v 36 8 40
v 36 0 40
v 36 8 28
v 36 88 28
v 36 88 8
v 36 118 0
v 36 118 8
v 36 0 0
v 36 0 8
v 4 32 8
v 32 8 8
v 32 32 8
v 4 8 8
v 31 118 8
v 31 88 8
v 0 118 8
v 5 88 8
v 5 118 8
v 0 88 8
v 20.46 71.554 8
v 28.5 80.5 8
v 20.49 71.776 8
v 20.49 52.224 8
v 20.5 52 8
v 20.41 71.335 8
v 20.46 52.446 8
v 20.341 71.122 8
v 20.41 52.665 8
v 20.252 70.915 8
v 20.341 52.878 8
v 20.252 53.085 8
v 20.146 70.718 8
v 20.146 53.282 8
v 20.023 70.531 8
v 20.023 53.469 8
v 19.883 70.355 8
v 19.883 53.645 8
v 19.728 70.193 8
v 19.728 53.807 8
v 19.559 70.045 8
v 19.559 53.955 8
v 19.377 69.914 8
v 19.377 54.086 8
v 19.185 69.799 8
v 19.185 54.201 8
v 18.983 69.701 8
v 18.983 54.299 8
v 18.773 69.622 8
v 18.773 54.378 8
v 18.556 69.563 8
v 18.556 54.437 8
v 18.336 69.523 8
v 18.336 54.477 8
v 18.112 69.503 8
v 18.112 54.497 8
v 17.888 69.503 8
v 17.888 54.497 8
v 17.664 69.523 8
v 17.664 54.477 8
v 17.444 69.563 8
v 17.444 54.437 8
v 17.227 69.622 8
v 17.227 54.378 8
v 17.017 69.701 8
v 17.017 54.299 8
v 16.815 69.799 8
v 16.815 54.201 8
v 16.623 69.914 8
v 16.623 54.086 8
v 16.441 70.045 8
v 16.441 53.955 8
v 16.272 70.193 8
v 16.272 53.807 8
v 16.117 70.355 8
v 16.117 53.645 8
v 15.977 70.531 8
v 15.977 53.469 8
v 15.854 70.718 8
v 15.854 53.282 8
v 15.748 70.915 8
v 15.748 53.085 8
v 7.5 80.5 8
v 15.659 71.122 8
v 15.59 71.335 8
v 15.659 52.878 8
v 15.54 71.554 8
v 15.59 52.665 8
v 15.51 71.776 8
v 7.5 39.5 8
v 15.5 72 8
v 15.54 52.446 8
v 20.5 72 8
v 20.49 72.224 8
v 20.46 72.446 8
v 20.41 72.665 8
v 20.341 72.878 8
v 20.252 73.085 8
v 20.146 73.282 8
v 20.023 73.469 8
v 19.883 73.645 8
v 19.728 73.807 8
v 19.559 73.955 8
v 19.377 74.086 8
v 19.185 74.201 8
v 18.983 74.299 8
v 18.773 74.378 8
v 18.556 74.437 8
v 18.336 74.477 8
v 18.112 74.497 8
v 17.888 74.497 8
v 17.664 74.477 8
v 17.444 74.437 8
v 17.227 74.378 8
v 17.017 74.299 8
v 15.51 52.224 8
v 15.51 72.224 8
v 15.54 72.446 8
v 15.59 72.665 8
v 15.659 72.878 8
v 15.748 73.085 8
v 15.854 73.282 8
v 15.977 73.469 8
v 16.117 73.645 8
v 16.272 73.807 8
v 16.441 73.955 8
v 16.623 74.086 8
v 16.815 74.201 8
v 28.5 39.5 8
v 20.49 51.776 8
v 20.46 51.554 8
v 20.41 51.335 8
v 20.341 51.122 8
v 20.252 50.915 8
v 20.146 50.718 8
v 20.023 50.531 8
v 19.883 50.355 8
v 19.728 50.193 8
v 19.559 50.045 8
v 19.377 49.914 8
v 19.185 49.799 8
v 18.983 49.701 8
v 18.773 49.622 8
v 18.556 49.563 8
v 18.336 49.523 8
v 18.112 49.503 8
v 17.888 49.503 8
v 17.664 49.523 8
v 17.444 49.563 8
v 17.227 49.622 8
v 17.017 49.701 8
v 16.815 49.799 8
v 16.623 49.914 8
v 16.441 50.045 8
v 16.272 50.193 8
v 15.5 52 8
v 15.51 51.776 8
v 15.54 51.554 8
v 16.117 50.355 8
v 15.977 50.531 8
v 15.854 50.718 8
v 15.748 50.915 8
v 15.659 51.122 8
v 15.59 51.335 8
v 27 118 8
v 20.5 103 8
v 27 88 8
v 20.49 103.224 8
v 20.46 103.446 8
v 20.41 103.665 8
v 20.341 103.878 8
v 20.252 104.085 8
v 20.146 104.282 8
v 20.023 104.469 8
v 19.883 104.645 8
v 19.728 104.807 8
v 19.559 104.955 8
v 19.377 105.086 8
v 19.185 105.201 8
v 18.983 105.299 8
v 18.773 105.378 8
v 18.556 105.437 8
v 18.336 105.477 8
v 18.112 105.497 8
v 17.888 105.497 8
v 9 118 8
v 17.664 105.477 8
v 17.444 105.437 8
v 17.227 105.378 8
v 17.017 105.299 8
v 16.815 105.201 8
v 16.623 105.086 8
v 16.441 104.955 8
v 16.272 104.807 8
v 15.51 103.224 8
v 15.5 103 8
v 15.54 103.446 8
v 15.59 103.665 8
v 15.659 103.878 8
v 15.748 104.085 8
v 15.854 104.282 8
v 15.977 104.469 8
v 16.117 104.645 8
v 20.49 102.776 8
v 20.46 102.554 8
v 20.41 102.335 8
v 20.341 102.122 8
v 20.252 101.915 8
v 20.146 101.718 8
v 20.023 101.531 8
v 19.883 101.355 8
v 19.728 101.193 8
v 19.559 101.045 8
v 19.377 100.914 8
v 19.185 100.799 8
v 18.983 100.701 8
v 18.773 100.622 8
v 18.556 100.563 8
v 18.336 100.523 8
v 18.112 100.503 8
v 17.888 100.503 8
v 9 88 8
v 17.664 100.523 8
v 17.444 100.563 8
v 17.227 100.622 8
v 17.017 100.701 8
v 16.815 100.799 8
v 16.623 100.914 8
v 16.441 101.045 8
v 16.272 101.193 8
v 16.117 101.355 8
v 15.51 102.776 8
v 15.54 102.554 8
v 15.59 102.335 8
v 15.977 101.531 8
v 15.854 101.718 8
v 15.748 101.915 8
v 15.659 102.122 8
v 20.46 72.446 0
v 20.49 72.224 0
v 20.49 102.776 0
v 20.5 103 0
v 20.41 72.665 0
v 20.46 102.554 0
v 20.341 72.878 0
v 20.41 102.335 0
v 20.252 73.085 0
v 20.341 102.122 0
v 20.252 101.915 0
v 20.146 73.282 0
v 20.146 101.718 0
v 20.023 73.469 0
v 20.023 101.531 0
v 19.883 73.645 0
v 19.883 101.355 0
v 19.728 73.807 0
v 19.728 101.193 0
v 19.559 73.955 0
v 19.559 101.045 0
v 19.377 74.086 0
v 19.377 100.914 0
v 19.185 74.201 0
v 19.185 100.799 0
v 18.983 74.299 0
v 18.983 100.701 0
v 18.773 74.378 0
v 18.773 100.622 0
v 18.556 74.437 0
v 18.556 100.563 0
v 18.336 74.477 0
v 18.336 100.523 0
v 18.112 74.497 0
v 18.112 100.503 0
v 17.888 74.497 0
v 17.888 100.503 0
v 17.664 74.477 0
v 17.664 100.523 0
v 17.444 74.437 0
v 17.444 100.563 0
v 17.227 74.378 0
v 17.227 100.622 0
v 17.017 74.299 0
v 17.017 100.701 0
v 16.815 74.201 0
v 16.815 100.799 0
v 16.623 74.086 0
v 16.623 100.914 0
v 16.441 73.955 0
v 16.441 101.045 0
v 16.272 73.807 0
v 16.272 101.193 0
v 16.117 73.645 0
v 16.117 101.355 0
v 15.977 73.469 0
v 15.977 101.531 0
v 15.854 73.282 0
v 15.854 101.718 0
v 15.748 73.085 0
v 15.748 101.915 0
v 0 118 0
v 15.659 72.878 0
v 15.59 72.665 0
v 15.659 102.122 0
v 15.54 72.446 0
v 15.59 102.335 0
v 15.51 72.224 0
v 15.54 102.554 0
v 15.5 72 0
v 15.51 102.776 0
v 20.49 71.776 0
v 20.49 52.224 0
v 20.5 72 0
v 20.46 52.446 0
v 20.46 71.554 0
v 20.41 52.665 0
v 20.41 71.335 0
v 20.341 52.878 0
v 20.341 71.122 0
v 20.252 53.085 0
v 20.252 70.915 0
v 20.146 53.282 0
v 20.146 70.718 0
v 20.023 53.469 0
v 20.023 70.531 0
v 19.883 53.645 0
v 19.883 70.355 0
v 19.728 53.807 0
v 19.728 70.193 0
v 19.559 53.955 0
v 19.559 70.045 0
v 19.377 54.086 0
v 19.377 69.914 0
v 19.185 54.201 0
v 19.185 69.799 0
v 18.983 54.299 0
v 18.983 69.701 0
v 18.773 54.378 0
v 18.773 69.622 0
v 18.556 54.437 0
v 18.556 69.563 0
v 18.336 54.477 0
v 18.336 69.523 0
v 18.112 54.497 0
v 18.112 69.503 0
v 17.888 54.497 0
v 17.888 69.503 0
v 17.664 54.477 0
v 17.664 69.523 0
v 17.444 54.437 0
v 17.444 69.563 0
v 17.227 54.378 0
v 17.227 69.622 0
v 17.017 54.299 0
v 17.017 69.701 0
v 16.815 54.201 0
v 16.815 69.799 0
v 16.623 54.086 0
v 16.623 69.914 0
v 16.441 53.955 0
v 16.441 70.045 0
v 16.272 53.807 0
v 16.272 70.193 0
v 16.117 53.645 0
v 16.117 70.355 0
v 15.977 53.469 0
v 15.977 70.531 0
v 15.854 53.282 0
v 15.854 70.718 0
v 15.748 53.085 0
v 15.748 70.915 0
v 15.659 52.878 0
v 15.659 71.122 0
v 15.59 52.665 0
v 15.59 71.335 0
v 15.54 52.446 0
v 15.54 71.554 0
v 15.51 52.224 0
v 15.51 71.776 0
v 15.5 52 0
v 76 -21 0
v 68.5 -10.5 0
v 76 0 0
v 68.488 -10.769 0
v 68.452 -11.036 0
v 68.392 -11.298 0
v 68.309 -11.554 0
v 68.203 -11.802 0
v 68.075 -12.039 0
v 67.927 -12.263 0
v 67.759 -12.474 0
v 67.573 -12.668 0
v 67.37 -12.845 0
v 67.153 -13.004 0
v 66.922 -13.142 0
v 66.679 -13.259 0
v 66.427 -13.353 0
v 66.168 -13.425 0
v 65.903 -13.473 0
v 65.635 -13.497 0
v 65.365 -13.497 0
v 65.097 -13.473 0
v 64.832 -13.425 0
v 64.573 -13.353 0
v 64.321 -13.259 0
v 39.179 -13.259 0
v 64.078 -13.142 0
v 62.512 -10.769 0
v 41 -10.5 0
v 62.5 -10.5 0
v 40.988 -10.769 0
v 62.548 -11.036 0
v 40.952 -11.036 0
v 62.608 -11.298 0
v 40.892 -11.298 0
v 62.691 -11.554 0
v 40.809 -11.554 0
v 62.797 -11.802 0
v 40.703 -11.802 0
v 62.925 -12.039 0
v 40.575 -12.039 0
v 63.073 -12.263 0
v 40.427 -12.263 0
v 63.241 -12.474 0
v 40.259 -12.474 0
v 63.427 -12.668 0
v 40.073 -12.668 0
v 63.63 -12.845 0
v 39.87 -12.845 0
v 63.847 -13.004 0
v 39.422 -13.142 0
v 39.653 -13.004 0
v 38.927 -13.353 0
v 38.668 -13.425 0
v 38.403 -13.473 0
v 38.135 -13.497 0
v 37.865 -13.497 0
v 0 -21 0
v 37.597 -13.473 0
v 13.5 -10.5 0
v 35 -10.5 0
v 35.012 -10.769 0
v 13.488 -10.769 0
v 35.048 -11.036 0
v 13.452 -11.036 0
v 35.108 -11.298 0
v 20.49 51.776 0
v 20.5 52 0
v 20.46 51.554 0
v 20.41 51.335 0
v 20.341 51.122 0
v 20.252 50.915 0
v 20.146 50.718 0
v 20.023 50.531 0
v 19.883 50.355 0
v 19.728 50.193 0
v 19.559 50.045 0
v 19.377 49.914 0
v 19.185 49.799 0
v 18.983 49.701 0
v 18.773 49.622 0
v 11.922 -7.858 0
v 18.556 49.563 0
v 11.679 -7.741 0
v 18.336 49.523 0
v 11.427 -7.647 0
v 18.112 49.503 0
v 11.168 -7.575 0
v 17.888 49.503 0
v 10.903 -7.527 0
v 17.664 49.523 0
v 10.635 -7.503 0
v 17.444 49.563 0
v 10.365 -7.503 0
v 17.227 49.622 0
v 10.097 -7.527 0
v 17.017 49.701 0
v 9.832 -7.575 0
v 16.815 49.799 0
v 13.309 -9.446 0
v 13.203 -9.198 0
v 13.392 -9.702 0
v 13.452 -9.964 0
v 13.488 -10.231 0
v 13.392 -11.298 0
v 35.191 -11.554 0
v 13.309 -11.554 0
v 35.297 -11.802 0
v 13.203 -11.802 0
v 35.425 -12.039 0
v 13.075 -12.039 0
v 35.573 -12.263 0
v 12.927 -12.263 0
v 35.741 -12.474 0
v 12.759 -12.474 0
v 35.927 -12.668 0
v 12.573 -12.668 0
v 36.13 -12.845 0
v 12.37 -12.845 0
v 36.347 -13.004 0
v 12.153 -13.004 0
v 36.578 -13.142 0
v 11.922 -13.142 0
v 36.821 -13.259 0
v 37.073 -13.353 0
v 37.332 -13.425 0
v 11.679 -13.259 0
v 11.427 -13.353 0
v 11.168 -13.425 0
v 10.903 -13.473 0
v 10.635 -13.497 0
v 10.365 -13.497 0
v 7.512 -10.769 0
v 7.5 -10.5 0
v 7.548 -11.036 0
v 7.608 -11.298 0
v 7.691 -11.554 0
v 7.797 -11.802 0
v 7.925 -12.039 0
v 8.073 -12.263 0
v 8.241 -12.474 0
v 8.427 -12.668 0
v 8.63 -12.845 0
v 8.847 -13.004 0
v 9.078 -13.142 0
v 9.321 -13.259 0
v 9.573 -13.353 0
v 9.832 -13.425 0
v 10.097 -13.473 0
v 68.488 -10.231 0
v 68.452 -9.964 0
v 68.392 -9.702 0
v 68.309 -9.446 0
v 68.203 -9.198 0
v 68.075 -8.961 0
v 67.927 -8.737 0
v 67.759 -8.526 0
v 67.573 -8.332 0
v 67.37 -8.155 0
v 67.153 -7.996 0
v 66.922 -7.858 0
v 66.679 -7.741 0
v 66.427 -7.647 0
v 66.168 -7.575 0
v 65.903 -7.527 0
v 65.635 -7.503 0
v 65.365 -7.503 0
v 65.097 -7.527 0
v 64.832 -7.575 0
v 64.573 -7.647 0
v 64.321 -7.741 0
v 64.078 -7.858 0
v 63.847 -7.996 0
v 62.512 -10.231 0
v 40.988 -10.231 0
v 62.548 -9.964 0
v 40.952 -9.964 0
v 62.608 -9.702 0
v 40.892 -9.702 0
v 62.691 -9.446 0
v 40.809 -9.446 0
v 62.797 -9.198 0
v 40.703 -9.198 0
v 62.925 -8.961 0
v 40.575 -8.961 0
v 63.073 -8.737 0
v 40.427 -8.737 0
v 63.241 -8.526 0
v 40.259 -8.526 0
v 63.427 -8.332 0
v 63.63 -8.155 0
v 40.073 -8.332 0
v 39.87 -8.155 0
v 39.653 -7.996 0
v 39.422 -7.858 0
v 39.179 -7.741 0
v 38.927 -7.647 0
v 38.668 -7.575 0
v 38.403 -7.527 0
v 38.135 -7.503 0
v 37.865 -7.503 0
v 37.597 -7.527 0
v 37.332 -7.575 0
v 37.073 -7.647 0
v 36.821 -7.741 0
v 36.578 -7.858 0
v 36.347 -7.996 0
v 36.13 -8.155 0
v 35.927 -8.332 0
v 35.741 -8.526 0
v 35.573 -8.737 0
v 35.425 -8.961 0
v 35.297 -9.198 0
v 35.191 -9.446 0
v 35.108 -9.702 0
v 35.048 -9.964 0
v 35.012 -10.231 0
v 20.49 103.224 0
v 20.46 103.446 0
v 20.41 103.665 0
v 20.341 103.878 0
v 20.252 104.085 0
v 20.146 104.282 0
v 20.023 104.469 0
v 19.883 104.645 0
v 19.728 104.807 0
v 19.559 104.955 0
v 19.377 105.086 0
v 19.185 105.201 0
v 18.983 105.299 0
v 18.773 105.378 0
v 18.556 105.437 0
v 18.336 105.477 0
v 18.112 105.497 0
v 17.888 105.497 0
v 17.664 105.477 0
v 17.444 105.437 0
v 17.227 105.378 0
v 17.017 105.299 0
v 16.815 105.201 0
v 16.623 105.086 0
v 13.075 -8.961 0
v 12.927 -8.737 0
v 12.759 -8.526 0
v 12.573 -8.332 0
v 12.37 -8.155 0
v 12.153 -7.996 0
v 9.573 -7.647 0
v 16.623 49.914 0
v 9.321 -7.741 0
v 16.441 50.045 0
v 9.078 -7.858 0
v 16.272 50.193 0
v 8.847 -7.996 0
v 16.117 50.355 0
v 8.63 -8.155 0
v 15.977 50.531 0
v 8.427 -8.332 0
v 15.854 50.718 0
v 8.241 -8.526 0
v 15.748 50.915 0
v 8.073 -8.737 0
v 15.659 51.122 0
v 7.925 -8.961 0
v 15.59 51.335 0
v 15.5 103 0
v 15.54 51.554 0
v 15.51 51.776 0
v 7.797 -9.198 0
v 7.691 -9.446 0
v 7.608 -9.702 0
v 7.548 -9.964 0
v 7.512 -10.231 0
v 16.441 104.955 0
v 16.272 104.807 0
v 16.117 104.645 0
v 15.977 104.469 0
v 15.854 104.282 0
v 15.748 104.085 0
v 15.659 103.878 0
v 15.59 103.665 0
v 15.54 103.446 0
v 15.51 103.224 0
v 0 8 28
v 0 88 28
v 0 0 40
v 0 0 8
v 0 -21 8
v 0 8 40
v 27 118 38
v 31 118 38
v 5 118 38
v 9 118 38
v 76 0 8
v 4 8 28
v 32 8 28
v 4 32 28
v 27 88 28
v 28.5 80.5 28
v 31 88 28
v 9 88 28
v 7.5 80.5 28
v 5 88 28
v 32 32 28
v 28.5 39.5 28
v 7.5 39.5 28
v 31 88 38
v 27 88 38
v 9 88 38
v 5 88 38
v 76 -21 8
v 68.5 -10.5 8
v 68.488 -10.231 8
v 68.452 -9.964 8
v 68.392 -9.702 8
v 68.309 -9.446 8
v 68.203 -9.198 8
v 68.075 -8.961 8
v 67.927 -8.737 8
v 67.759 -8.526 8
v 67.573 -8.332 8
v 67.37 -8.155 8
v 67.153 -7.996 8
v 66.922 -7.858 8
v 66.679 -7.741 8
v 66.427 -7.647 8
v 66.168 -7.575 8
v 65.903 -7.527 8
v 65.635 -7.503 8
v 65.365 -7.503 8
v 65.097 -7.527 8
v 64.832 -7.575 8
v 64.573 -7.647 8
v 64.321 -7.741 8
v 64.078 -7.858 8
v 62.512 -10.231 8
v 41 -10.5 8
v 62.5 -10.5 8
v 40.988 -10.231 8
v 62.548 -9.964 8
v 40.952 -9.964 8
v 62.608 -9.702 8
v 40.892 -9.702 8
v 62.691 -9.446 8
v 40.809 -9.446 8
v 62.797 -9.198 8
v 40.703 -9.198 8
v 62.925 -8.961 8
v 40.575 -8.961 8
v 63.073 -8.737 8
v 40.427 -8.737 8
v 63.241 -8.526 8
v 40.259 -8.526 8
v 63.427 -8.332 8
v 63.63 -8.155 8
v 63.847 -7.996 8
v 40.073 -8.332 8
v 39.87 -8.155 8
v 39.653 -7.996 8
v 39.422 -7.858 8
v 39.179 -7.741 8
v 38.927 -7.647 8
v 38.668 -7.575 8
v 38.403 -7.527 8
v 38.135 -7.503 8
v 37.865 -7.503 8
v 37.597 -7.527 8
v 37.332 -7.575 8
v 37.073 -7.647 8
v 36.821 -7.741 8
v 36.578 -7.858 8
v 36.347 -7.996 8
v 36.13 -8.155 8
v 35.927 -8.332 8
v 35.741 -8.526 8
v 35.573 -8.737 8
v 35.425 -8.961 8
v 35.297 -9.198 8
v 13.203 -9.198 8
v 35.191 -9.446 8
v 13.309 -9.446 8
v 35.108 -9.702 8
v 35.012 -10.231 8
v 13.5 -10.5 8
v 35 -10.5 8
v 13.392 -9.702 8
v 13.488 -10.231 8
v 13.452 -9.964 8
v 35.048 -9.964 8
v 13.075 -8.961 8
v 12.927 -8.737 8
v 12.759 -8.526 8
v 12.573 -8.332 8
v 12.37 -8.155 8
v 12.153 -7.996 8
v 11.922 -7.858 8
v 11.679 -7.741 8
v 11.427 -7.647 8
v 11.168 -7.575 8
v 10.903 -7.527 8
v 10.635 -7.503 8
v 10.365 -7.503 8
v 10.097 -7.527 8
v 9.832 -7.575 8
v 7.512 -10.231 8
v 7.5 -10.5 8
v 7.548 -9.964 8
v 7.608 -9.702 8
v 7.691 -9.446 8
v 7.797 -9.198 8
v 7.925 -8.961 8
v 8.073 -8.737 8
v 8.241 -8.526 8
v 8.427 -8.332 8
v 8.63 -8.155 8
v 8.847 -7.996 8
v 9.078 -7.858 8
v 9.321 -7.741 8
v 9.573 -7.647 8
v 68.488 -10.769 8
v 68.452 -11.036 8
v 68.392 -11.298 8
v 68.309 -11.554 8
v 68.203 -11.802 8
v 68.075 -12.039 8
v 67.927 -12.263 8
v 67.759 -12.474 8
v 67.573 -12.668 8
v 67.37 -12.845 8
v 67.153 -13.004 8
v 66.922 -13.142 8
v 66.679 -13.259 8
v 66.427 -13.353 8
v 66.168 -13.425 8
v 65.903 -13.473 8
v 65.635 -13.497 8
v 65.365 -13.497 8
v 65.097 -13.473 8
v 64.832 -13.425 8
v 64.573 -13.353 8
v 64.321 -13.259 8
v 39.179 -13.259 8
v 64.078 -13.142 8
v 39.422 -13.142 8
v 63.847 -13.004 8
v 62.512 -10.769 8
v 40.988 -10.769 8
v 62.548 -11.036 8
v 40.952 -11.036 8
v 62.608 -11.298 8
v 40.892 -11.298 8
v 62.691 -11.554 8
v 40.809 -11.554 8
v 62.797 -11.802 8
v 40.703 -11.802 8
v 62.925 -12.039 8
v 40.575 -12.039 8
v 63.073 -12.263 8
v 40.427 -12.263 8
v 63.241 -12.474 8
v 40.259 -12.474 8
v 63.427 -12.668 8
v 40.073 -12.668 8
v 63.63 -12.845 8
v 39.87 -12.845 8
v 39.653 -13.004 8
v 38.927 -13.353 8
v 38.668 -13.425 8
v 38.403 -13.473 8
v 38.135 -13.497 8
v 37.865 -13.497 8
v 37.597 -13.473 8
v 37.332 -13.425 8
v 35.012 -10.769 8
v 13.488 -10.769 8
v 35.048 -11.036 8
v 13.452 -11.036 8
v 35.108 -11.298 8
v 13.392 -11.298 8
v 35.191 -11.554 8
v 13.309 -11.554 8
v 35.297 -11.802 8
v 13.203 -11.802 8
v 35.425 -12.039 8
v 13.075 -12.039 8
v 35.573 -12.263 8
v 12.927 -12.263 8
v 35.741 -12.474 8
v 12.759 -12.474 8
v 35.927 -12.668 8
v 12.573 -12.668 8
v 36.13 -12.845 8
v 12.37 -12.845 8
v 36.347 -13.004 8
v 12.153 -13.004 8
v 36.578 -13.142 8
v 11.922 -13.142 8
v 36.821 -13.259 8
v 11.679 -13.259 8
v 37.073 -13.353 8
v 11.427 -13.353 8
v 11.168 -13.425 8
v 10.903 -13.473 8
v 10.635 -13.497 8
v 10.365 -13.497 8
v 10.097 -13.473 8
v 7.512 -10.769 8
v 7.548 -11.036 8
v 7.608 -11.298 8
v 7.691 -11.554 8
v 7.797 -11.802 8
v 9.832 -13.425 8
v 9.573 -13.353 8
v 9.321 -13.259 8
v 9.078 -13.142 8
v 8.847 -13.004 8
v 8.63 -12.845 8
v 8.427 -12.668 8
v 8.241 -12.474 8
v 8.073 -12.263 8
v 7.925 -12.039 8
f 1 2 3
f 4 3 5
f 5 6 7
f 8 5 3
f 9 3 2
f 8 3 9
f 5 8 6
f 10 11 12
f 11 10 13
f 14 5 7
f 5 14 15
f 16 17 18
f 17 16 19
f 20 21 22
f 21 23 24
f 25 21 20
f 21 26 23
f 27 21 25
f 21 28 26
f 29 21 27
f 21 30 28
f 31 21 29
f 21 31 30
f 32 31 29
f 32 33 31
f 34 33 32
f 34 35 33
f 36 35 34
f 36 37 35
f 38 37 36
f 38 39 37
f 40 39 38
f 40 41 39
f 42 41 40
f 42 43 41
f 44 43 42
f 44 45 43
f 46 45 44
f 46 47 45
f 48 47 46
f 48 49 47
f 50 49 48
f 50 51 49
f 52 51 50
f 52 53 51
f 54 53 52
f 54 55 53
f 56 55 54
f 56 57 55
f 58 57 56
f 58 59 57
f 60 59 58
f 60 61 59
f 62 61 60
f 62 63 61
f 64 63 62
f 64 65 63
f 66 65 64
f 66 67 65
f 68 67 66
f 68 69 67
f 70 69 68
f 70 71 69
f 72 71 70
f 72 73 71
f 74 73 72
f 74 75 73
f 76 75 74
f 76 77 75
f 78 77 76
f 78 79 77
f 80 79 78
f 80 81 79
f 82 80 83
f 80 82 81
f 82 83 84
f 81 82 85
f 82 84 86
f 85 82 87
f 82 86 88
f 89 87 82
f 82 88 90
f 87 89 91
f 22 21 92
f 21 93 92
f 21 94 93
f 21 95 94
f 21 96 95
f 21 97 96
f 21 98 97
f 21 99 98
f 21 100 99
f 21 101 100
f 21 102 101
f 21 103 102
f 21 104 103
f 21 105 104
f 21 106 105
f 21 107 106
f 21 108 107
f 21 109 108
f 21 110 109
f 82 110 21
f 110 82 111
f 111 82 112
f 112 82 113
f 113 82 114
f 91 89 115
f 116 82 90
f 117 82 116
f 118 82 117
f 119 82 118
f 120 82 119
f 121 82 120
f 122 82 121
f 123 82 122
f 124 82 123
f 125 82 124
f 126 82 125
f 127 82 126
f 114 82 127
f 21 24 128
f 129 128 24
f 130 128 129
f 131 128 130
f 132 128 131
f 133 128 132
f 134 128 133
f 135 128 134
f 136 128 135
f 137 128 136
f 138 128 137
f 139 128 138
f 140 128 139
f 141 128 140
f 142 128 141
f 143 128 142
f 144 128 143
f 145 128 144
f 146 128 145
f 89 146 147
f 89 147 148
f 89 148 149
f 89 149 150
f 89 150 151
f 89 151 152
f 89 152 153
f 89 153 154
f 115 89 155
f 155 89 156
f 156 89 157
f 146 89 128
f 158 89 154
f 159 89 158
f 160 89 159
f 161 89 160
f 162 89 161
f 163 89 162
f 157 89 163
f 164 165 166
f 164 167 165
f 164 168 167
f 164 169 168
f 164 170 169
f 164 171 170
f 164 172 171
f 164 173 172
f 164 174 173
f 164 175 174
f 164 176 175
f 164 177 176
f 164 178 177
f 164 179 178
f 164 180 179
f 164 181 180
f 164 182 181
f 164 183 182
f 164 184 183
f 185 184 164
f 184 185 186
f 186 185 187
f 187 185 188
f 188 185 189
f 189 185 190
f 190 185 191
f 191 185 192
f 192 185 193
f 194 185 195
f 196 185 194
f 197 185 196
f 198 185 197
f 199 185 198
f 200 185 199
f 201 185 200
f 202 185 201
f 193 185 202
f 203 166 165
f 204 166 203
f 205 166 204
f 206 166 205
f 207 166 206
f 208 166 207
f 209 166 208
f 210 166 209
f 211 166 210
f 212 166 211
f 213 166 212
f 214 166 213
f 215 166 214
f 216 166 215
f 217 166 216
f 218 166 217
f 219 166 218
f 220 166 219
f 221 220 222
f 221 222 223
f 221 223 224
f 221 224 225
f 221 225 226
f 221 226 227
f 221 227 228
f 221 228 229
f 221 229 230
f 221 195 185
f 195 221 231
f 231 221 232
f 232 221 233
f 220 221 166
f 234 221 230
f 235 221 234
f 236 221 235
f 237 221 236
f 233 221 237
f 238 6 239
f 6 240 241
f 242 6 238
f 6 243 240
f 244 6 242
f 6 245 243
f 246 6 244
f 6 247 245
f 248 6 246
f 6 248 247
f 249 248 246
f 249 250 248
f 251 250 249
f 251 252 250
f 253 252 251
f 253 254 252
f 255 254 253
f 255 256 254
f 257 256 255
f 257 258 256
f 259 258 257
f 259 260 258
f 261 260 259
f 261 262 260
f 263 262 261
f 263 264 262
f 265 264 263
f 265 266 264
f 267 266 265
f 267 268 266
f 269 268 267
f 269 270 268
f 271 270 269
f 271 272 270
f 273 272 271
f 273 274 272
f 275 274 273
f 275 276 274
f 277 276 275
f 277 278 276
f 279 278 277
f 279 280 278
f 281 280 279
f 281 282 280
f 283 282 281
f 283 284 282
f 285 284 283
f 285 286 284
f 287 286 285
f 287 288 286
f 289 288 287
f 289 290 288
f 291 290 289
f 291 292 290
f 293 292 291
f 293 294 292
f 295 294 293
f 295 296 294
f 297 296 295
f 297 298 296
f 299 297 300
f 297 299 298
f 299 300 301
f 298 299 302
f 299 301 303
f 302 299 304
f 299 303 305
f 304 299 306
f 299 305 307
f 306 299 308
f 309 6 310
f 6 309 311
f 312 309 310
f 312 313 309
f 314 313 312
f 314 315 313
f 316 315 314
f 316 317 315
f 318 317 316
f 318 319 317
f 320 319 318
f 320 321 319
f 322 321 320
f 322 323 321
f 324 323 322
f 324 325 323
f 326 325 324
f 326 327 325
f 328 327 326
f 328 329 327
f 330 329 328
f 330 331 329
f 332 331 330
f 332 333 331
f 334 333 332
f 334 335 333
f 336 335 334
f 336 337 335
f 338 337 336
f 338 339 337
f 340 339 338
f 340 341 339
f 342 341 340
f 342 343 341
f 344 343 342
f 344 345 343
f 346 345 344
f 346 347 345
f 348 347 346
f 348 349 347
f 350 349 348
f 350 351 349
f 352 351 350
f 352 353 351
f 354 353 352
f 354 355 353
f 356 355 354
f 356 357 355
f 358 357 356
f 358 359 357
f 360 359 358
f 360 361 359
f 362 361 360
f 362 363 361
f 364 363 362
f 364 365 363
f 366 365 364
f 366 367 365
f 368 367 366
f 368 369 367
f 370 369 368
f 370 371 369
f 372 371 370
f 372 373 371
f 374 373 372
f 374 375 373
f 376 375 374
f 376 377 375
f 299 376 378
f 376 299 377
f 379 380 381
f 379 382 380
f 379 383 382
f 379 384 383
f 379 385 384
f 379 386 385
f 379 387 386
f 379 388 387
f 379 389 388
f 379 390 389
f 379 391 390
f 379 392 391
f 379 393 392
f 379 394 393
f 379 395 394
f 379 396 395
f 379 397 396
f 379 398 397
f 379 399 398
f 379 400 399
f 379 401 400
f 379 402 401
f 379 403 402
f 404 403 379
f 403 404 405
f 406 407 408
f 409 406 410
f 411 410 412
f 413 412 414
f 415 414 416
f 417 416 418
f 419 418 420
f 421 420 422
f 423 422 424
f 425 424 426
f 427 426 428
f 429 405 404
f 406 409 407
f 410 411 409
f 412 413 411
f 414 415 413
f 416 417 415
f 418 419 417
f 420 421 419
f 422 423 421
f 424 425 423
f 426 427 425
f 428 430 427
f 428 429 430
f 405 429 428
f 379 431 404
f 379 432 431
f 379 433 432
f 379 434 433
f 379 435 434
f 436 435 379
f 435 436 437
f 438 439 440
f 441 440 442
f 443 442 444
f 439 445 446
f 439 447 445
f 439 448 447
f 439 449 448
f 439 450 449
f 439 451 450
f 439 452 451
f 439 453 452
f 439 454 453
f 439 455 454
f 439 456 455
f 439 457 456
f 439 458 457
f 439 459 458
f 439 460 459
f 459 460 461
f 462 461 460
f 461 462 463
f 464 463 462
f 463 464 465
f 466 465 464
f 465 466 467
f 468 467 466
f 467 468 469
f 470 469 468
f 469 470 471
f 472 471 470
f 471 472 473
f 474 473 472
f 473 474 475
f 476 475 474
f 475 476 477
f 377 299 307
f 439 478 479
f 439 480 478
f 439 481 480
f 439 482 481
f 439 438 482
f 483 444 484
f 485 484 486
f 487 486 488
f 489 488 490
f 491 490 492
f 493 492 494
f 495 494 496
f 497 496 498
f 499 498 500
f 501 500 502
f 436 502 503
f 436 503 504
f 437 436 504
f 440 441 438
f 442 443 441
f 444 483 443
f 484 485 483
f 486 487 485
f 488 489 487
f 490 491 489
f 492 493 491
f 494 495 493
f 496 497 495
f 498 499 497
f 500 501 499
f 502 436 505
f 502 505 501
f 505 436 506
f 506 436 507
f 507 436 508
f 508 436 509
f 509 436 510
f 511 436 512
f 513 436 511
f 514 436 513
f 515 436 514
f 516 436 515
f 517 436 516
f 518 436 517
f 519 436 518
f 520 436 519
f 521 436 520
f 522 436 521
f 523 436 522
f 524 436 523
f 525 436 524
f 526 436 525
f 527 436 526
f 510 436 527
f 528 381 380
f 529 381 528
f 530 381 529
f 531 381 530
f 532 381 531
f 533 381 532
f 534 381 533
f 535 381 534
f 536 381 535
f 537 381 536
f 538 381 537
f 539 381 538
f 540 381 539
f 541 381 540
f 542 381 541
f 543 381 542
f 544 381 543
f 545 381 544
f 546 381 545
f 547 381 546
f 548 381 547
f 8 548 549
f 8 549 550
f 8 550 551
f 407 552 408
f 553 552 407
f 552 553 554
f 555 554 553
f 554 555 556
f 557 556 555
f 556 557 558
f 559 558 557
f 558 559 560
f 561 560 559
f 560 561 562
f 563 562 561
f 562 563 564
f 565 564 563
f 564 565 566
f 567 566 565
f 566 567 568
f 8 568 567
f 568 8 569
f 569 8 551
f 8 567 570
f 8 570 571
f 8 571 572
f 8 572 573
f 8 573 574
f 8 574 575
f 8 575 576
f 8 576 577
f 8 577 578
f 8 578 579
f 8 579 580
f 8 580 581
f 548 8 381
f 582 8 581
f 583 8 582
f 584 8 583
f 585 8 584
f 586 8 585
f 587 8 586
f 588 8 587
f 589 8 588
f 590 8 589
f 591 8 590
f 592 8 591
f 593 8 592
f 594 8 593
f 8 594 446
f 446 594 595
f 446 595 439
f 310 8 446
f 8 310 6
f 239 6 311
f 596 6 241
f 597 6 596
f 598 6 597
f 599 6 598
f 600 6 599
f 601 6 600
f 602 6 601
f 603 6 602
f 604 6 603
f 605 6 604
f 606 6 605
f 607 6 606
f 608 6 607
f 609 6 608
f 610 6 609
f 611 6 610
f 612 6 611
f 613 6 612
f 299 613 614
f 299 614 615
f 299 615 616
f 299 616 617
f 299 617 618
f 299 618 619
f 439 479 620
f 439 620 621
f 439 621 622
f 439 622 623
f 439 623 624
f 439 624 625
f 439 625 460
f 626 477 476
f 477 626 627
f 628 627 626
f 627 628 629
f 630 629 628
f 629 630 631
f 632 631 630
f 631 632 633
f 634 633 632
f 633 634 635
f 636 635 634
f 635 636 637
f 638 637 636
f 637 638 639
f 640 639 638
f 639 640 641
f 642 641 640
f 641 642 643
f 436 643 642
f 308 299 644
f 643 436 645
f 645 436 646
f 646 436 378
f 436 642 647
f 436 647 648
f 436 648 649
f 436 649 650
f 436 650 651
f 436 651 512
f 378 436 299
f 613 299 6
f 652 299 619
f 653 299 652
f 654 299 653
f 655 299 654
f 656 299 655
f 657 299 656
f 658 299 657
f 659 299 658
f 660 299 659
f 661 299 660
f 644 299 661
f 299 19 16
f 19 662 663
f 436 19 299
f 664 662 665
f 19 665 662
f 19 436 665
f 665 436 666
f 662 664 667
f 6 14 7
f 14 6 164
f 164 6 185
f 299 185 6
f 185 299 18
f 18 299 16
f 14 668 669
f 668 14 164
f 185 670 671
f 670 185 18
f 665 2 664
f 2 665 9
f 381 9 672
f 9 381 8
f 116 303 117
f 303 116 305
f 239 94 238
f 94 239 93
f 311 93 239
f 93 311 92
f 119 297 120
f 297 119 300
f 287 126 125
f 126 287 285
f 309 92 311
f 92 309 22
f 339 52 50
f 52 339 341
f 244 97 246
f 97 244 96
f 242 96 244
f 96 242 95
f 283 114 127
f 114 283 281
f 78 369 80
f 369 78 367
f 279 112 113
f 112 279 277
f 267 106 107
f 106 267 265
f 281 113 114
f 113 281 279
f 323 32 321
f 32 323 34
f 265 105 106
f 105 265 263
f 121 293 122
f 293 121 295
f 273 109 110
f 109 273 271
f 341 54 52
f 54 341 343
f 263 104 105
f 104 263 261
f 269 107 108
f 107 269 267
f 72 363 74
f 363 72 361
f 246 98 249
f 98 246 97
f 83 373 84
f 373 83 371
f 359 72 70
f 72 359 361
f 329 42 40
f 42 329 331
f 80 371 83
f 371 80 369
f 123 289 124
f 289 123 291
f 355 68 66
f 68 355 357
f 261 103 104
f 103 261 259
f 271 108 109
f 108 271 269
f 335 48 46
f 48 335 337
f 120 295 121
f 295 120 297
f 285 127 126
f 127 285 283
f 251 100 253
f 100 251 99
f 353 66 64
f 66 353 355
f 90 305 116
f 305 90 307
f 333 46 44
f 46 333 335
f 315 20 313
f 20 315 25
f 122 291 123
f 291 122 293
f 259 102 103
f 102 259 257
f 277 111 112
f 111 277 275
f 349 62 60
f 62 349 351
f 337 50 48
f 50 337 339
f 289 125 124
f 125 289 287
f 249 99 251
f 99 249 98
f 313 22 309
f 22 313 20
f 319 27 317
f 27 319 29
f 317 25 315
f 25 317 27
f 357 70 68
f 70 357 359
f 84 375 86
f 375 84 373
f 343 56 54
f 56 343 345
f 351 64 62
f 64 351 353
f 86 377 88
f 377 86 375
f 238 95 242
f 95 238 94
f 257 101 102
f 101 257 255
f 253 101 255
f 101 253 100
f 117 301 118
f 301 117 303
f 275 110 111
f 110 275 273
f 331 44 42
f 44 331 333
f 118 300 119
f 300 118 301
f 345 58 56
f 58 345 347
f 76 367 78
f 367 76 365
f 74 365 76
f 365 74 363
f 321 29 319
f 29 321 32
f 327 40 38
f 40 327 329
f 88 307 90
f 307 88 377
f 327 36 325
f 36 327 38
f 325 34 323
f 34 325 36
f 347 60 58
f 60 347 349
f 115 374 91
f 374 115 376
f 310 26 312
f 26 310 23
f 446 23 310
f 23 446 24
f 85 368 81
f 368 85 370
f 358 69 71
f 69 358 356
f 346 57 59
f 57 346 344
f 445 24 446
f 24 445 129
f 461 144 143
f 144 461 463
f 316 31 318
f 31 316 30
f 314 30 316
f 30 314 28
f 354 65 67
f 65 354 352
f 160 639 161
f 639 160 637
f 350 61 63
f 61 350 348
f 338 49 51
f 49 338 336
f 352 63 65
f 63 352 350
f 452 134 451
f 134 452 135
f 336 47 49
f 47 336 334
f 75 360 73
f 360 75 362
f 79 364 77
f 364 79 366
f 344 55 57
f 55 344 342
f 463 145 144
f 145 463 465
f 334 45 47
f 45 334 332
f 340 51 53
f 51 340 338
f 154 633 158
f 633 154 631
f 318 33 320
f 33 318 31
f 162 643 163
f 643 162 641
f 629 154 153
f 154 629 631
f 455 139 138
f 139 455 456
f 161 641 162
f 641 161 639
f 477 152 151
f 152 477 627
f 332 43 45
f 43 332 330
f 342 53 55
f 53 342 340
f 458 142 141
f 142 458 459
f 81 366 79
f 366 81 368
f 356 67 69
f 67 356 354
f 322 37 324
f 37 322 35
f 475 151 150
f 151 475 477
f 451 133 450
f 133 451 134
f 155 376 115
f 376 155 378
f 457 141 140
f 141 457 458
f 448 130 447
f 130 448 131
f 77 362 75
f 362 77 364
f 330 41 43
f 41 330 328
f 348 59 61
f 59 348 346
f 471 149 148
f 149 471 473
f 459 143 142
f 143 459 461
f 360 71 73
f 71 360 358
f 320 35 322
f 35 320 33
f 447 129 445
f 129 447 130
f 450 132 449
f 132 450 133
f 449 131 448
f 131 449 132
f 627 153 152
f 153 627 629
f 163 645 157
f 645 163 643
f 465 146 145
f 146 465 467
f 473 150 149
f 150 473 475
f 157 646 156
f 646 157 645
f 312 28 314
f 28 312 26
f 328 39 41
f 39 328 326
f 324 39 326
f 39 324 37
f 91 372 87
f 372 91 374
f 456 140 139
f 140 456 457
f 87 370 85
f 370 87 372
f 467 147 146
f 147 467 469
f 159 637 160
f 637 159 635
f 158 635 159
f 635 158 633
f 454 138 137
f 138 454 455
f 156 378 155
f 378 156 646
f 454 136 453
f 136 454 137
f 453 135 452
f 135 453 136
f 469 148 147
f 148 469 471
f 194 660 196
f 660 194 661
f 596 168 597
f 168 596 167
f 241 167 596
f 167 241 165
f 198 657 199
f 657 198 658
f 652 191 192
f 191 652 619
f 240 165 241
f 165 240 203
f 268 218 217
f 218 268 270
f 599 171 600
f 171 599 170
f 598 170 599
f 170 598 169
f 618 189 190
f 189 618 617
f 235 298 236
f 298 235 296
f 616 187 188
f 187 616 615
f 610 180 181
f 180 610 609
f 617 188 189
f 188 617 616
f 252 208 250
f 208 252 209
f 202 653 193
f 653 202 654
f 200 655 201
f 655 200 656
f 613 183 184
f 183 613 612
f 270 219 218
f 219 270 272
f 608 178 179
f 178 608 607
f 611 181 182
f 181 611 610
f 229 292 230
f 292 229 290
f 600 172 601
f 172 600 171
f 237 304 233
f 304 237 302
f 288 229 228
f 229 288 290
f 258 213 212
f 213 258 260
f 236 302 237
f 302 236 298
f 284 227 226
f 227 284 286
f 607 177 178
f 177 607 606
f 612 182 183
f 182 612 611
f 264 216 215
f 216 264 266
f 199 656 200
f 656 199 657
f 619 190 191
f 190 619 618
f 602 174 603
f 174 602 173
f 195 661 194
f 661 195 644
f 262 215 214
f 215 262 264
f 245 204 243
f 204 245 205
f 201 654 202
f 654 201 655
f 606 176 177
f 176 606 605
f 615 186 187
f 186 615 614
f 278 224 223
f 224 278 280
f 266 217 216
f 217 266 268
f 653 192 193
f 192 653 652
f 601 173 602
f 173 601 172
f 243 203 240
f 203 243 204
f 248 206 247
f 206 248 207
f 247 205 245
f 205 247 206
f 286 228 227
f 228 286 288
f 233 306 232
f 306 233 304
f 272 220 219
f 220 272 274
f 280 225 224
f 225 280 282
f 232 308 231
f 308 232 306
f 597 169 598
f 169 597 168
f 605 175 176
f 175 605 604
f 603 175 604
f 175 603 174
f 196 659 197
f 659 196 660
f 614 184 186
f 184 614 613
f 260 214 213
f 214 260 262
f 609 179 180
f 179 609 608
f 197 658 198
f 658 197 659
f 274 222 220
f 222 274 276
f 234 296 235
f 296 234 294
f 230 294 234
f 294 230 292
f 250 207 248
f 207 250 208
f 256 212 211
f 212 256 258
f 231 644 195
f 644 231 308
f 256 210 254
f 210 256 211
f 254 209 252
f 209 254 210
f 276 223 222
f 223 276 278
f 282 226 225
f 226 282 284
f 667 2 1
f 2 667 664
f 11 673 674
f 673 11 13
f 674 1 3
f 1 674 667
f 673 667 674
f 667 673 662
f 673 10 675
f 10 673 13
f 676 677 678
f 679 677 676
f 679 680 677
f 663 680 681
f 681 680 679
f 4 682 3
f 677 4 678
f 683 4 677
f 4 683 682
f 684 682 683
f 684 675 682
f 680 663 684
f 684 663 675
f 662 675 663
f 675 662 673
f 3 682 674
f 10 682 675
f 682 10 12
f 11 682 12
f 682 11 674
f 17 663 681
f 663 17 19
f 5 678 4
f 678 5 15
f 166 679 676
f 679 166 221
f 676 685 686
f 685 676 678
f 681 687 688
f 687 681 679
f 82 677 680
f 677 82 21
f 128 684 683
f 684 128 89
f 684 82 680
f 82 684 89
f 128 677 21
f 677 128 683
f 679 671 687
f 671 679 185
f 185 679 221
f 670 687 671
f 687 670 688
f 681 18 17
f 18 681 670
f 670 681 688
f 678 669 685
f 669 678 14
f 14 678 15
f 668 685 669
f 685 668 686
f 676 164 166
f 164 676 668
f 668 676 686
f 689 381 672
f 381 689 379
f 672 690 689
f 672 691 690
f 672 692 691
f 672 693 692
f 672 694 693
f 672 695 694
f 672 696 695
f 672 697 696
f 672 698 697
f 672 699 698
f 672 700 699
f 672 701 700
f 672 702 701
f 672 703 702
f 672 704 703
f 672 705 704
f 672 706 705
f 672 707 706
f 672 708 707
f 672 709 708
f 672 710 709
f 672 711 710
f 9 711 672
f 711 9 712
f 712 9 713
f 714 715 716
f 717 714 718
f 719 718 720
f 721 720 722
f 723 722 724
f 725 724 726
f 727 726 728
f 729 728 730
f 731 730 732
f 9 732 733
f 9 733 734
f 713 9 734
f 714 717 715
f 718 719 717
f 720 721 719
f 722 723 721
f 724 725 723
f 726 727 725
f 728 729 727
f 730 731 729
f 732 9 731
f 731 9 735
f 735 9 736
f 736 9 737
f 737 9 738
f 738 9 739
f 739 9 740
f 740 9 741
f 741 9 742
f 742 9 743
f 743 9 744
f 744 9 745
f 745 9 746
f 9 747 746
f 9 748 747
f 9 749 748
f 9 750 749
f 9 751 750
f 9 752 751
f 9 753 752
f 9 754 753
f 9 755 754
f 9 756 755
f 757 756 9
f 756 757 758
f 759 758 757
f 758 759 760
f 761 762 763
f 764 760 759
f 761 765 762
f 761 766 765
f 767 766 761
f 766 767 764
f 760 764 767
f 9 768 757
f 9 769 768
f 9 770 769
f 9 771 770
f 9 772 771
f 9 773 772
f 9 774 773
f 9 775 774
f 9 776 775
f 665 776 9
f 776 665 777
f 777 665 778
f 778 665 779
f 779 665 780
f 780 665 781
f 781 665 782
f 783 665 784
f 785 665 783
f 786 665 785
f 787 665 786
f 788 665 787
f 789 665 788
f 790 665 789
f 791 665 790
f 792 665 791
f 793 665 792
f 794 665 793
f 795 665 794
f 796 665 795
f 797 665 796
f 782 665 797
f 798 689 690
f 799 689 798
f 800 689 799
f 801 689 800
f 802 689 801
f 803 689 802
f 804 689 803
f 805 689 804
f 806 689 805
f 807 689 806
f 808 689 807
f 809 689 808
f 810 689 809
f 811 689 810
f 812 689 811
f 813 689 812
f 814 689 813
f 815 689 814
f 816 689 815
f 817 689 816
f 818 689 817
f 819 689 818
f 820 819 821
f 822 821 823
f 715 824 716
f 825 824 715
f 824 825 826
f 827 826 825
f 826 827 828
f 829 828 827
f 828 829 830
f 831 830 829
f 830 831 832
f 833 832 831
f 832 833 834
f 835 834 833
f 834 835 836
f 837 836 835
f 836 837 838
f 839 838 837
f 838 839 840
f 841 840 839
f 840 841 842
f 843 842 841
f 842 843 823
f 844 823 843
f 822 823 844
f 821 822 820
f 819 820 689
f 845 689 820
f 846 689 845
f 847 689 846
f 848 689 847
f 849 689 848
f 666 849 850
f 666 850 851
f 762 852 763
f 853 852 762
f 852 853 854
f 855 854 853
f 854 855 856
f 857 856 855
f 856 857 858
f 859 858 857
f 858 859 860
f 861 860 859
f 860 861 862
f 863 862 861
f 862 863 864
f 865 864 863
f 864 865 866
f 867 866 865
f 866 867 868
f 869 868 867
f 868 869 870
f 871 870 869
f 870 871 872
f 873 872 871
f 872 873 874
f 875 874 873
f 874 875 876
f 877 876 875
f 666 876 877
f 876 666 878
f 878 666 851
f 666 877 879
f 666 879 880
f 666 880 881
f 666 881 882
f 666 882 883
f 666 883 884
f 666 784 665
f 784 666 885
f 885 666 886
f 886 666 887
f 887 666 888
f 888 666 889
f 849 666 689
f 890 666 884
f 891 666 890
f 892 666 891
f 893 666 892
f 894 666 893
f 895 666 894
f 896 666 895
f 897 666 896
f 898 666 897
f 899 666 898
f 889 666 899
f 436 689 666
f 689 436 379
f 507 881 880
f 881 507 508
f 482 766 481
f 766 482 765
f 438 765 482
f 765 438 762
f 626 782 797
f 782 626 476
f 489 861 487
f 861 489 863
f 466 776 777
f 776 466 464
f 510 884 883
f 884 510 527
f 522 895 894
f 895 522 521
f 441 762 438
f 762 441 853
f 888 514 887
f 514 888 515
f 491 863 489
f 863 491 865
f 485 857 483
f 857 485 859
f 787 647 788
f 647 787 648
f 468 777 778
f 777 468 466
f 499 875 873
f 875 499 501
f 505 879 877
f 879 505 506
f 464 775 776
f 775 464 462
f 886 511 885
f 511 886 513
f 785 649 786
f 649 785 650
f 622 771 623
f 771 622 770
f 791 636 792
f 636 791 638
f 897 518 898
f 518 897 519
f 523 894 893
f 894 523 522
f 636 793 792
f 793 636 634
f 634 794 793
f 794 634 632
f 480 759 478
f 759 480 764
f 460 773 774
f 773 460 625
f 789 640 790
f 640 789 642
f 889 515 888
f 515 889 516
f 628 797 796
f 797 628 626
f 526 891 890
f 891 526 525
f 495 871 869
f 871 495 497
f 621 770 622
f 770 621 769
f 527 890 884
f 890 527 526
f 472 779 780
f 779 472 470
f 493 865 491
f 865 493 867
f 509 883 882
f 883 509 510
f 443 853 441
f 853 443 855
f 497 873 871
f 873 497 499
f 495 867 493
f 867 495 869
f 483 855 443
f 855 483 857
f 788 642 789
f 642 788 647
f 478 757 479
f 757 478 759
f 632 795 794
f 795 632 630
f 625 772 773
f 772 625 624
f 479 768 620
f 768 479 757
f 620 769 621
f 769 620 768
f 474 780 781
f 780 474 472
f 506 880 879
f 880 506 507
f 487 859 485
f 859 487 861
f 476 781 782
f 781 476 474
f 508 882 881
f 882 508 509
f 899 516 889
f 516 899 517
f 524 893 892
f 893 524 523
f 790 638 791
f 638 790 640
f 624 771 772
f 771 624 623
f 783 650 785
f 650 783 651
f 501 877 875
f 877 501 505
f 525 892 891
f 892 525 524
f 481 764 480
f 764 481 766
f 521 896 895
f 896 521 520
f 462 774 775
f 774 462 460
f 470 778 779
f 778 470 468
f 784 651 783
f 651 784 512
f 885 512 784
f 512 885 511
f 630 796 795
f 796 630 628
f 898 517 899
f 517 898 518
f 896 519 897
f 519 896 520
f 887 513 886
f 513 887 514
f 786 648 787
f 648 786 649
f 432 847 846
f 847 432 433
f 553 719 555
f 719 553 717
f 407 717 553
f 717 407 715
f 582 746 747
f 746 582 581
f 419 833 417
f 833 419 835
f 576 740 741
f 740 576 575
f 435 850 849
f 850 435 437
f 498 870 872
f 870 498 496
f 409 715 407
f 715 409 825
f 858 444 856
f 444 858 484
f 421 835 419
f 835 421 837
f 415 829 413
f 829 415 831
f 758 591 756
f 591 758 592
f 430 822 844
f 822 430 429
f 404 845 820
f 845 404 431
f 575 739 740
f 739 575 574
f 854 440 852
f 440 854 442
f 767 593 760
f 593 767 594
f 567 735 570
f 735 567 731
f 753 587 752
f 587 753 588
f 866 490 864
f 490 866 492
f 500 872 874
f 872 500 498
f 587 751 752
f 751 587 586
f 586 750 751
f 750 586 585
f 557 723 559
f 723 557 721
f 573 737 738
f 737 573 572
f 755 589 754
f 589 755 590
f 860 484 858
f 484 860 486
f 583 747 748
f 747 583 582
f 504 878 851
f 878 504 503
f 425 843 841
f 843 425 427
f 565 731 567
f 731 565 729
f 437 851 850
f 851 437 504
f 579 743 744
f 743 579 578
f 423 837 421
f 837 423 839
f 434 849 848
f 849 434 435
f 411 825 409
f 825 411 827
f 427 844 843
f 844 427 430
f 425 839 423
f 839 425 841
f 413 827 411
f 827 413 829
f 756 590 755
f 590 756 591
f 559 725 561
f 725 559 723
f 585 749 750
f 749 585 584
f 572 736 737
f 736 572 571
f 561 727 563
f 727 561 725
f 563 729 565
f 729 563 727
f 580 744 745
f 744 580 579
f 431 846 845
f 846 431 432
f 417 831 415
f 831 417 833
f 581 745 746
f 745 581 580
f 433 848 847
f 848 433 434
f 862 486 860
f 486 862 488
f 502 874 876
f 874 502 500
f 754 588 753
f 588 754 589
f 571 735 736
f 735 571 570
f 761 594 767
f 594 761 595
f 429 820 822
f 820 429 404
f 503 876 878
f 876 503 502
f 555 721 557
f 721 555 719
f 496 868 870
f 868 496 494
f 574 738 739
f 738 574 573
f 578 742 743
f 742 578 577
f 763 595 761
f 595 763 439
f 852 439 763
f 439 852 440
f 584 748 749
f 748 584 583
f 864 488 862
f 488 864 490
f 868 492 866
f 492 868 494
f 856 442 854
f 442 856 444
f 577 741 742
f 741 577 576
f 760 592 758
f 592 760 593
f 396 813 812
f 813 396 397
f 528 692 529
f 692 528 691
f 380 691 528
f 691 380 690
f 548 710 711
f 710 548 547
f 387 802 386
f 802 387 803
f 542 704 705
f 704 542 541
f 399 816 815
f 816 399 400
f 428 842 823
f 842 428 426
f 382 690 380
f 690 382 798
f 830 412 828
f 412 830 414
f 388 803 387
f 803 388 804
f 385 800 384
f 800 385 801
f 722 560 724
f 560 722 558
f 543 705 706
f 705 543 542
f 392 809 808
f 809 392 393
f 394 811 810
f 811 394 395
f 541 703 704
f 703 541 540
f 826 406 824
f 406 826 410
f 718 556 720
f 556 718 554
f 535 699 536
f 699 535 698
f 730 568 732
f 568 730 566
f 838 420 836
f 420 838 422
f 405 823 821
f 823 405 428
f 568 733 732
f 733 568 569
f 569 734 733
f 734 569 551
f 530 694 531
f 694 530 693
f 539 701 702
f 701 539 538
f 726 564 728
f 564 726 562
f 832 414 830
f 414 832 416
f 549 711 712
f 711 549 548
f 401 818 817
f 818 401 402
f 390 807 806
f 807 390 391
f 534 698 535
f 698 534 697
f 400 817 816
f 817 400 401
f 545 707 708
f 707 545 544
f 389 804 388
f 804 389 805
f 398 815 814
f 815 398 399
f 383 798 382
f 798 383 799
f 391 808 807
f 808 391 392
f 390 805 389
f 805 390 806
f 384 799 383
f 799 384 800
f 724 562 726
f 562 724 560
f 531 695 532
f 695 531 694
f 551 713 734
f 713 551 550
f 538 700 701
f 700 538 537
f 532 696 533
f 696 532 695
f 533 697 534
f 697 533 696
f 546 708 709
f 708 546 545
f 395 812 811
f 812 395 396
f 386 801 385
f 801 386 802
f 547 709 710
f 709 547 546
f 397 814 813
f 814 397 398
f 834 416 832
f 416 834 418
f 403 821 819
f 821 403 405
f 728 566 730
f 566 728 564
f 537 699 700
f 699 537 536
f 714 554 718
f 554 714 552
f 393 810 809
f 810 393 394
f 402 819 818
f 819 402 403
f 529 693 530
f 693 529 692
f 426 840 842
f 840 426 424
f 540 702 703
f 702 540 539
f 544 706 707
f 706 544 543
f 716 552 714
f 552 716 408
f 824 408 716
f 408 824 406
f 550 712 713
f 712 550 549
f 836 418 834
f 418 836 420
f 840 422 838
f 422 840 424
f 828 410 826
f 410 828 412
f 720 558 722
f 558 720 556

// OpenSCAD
// X Axis plate
$fn = 70;

plateWidth = 8;
baseHeight = 21;
baseWidth = 20 + plateWidth*2 + 40;
baseScrewDiam = 6;
railScrewDiam = 5;
beltTensionerL = 30;
railBoxBuffer = 0.5;

// uncomment this translate to get the mirrored (left) part
//translate([40, 0, 0])
railHolder();
translate([0, -baseHeight, 0])
base();

module railHolder() {
    difference() {
        cube([20 + plateWidth*2, 80 + plateWidth + beltTensionerL, plateWidth]);
        
        // Rail screws
        translate([plateWidth + 10, 80 - plateWidth, -0.5])
        cylinder(h = plateWidth + 1.0, d = railScrewDiam);
        translate([plateWidth + 10, 80 - plateWidth - 20, -0.5])
        cylinder(h = plateWidth + 1.0, d = railScrewDiam);
        
        // belt tensioner screw
        translate([plateWidth + 10, 80 + plateWidth + beltTensionerL/2, -0.5])
        cylinder(h = plateWidth + 1.0, d = railScrewDiam);
    }
    
    // brace
    // on bed
    cube([20 + plateWidth*2, plateWidth, 40]);
    // bed brace (guessed the numbers ;-) )
    translate([0, plateWidth, plateWidth])
    cube([plateWidth/2, 24, 20]);
    translate([20 + plateWidth*1.5, plateWidth, plateWidth])
    cube([plateWidth/2, 24, 20]);
    
    // 2040 box
    // t
    translate([0, 80 + railBoxBuffer, plateWidth])
    cube([20 + plateWidth*2, plateWidth - railBoxBuffer, 20]);
    // b
    translate([0, 40 - plateWidth, plateWidth])
    cube([20 + plateWidth*2, plateWidth - railBoxBuffer, 20]);
    // l
    translate([0, 40 - railBoxBuffer, plateWidth])
    cube([plateWidth - railBoxBuffer, 40 + 1.0, 20]);
    // r
    translate([20 + plateWidth + railBoxBuffer, 40 - 0.5, plateWidth])
    cube([plateWidth - railBoxBuffer, 40 + 1.0, 20]);
    
    // belt tensioner surround
    translate([5, 80 + plateWidth, plateWidth])
    cube([plateWidth/2, beltTensionerL, 30]);
    translate([15 + plateWidth*1.5, 80 + plateWidth, plateWidth])
    cube([plateWidth/2, beltTensionerL, 30]);
}

module base() {
    difference() {
        cube([baseWidth, baseHeight, plateWidth]);

        // l
        translate([baseHeight/2, baseHeight/2, -0.5])
        cylinder(h = plateWidth + 1.0, d = baseScrewDiam);
        // m
        translate([baseWidth/2, baseHeight/2, -0.5])
        cylinder(h = plateWidth + 1.0, d = baseScrewDiam);
        // r
        translate([baseWidth - baseHeight/2, baseHeight/2, -0.5])
        cylinder(h = plateWidth + 1.0, d = baseScrewDiam);
    }
}
